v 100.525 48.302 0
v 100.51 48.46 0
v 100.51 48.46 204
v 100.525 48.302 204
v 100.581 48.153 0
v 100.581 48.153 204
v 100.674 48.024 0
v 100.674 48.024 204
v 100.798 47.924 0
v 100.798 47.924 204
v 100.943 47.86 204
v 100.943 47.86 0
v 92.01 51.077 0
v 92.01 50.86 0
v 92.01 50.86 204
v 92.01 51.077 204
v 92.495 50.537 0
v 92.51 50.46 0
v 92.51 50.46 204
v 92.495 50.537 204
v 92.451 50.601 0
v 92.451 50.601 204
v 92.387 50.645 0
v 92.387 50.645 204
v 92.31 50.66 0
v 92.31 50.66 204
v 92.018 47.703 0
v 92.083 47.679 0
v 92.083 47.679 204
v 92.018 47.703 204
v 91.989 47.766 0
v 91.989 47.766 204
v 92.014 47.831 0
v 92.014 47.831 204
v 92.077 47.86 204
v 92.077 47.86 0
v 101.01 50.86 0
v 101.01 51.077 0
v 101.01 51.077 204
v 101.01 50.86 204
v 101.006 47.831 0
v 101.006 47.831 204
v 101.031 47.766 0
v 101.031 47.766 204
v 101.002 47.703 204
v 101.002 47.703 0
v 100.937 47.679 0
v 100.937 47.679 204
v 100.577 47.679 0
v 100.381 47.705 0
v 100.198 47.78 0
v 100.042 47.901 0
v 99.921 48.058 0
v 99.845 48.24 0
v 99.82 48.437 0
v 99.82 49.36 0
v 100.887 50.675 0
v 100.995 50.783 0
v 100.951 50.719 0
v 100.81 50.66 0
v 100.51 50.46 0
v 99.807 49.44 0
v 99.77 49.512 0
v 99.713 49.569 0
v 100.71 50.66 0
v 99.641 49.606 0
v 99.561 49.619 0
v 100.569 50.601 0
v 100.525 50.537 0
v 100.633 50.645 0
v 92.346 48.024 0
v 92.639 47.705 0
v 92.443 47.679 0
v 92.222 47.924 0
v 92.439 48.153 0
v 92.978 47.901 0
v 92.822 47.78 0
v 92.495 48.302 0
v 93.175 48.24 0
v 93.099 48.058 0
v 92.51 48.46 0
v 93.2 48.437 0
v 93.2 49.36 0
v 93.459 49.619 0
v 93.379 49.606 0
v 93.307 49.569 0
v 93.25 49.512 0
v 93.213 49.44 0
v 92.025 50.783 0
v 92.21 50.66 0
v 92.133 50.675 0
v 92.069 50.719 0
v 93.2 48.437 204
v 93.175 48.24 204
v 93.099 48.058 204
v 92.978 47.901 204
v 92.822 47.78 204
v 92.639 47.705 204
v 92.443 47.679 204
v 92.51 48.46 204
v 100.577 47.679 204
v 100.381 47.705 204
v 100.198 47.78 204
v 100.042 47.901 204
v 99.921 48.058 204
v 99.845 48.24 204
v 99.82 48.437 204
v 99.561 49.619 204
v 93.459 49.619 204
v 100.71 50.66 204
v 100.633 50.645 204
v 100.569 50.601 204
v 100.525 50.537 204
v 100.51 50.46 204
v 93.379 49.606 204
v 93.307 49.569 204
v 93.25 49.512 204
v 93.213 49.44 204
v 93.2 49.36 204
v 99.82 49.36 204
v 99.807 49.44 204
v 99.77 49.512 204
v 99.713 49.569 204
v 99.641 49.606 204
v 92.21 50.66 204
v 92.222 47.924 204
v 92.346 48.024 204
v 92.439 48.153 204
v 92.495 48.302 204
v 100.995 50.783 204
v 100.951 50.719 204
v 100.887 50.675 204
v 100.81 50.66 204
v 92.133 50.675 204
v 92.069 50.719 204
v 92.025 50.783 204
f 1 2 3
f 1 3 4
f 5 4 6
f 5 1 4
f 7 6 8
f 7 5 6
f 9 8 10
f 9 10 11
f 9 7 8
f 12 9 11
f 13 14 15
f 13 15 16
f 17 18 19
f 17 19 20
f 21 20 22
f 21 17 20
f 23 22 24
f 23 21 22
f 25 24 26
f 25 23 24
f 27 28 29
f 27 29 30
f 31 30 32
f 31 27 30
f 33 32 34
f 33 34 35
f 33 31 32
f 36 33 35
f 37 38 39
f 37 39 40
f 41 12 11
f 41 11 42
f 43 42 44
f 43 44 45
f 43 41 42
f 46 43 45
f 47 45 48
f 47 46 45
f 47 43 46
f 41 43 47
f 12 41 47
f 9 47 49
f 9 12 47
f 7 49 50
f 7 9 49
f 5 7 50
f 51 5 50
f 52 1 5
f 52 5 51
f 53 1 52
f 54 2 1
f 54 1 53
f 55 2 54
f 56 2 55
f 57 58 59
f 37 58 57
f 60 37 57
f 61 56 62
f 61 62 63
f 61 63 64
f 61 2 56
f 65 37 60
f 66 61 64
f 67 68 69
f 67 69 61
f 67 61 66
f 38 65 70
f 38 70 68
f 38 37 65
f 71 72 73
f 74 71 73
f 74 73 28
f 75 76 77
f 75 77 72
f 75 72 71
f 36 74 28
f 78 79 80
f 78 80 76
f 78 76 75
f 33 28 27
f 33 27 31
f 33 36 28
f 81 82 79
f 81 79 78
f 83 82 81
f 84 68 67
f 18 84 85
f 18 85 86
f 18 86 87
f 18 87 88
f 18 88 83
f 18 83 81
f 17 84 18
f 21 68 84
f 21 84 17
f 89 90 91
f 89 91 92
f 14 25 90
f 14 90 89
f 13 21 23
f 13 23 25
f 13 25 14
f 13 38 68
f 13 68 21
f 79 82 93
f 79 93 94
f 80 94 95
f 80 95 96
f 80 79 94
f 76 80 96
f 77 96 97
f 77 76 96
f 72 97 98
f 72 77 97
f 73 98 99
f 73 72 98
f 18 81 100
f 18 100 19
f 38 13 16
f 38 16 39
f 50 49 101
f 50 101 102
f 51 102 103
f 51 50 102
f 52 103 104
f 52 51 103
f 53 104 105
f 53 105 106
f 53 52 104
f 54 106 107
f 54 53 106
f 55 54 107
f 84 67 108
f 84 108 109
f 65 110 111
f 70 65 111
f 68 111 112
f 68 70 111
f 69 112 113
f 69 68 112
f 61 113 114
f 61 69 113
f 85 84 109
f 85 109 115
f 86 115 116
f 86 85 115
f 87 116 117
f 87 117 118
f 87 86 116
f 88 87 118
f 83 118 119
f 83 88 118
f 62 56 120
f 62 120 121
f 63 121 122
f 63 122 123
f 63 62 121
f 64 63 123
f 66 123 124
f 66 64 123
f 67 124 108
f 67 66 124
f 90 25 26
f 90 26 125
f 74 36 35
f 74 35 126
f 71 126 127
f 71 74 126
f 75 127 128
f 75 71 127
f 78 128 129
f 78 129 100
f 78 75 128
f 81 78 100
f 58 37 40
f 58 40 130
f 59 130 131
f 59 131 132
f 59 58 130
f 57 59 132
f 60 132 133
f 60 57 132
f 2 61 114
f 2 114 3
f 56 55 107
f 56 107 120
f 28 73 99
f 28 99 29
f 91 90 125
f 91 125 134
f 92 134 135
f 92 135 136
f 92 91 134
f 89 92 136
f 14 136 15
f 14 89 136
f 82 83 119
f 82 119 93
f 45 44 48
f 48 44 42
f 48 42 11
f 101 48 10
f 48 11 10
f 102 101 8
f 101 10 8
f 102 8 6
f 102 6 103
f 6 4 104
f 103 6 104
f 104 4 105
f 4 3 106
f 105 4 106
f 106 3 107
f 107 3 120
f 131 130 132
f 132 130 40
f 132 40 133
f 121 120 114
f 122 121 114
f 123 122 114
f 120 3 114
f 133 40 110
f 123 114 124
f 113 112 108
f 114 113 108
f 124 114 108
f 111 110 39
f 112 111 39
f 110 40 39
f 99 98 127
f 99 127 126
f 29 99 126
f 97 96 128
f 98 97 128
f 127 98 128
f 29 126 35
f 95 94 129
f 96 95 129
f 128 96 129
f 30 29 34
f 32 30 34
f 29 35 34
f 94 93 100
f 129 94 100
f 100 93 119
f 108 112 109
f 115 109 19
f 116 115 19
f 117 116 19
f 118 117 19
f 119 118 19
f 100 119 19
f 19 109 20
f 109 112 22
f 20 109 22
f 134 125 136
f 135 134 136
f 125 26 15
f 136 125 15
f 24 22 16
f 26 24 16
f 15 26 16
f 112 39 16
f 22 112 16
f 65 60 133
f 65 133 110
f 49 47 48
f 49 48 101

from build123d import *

# Parameters (mm, degrees)
BOSS_EXTRUDE1_DEPTH = 204


with BuildPart() as part:
    # Szkic1 → Boss-Extrude1 (new body)
    with BuildSketch(Plane.XY):
        with BuildLine():
            Line((92.010000436, 51.077414838), (101.009999564, 51.077414838))
            Line((101.009999564, 51.077414838), (101.009999564, 50.859999228))
            ThreePointArc((101.009999564, 50.859999228), (100.95142109, 50.718578281), (100.810000144, 50.659999808))
            Line((100.810000144, 50.659999808), (100.710000374, 50.659999808))
            ThreePointArc((100.710000374, 50.659999808), (100.568578753, 50.601421054), (100.51, 50.459999434))
            Line((100.51, 50.459999434), (100.51, 48.459999434))
            ThreePointArc((100.51, 48.459999434), (100.623168266, 48.085202764), (100.943422808, 47.859999237))
            ThreePointArc((100.943422808, 47.859999237), (101.030642298, 47.766174714), (100.936817775, 47.678955223))
            Line((100.936817775, 47.678955223), (100.57727329, 47.678955223))
            ThreePointArc((100.57727329, 47.678955223), (100.041576562, 47.900848073), (99.819683712, 48.436544801))
            Line((99.819683712, 48.436544801), (99.819683712, 49.359999626))
            ThreePointArc((99.819683712, 49.359999626), (99.743947721, 49.542842483), (99.561104865, 49.618578474))
            Line((99.561104865, 49.618578474), (93.458895135, 49.618578474))
            ThreePointArc((93.458895135, 49.618578474), (93.276052279, 49.542842483), (93.200316288, 49.359999626))
            Line((93.200316288, 49.359999626), (93.200316288, 48.436544801))
            ThreePointArc((93.200316288, 48.436544801), (92.978423438, 47.900848073), (92.44272671, 47.678955223))
            Line((92.44272671, 47.678955223), (92.083182225, 47.678955223))
            ThreePointArc((92.083182225, 47.678955223), (91.989357702, 47.766174714), (92.076577192, 47.859999237))
            ThreePointArc((92.076577192, 47.859999237), (92.396831734, 48.085202764), (92.51, 48.459999434))
            Line((92.51, 48.459999434), (92.51, 50.459999434))
            ThreePointArc((92.51, 50.459999434), (92.451421247, 50.601421054), (92.309999626, 50.659999808))
            Line((92.309999626, 50.659999808), (92.209999856, 50.659999808))
            ThreePointArc((92.209999856, 50.659999808), (92.06857891, 50.718578281), (92.010000436, 50.859999228))
            Line((92.010000436, 50.859999228), (92.010000436, 51.077414838))
        make_face()
    extrude(amount=BOSS_EXTRUDE1_DEPTH)


solid = part.part
